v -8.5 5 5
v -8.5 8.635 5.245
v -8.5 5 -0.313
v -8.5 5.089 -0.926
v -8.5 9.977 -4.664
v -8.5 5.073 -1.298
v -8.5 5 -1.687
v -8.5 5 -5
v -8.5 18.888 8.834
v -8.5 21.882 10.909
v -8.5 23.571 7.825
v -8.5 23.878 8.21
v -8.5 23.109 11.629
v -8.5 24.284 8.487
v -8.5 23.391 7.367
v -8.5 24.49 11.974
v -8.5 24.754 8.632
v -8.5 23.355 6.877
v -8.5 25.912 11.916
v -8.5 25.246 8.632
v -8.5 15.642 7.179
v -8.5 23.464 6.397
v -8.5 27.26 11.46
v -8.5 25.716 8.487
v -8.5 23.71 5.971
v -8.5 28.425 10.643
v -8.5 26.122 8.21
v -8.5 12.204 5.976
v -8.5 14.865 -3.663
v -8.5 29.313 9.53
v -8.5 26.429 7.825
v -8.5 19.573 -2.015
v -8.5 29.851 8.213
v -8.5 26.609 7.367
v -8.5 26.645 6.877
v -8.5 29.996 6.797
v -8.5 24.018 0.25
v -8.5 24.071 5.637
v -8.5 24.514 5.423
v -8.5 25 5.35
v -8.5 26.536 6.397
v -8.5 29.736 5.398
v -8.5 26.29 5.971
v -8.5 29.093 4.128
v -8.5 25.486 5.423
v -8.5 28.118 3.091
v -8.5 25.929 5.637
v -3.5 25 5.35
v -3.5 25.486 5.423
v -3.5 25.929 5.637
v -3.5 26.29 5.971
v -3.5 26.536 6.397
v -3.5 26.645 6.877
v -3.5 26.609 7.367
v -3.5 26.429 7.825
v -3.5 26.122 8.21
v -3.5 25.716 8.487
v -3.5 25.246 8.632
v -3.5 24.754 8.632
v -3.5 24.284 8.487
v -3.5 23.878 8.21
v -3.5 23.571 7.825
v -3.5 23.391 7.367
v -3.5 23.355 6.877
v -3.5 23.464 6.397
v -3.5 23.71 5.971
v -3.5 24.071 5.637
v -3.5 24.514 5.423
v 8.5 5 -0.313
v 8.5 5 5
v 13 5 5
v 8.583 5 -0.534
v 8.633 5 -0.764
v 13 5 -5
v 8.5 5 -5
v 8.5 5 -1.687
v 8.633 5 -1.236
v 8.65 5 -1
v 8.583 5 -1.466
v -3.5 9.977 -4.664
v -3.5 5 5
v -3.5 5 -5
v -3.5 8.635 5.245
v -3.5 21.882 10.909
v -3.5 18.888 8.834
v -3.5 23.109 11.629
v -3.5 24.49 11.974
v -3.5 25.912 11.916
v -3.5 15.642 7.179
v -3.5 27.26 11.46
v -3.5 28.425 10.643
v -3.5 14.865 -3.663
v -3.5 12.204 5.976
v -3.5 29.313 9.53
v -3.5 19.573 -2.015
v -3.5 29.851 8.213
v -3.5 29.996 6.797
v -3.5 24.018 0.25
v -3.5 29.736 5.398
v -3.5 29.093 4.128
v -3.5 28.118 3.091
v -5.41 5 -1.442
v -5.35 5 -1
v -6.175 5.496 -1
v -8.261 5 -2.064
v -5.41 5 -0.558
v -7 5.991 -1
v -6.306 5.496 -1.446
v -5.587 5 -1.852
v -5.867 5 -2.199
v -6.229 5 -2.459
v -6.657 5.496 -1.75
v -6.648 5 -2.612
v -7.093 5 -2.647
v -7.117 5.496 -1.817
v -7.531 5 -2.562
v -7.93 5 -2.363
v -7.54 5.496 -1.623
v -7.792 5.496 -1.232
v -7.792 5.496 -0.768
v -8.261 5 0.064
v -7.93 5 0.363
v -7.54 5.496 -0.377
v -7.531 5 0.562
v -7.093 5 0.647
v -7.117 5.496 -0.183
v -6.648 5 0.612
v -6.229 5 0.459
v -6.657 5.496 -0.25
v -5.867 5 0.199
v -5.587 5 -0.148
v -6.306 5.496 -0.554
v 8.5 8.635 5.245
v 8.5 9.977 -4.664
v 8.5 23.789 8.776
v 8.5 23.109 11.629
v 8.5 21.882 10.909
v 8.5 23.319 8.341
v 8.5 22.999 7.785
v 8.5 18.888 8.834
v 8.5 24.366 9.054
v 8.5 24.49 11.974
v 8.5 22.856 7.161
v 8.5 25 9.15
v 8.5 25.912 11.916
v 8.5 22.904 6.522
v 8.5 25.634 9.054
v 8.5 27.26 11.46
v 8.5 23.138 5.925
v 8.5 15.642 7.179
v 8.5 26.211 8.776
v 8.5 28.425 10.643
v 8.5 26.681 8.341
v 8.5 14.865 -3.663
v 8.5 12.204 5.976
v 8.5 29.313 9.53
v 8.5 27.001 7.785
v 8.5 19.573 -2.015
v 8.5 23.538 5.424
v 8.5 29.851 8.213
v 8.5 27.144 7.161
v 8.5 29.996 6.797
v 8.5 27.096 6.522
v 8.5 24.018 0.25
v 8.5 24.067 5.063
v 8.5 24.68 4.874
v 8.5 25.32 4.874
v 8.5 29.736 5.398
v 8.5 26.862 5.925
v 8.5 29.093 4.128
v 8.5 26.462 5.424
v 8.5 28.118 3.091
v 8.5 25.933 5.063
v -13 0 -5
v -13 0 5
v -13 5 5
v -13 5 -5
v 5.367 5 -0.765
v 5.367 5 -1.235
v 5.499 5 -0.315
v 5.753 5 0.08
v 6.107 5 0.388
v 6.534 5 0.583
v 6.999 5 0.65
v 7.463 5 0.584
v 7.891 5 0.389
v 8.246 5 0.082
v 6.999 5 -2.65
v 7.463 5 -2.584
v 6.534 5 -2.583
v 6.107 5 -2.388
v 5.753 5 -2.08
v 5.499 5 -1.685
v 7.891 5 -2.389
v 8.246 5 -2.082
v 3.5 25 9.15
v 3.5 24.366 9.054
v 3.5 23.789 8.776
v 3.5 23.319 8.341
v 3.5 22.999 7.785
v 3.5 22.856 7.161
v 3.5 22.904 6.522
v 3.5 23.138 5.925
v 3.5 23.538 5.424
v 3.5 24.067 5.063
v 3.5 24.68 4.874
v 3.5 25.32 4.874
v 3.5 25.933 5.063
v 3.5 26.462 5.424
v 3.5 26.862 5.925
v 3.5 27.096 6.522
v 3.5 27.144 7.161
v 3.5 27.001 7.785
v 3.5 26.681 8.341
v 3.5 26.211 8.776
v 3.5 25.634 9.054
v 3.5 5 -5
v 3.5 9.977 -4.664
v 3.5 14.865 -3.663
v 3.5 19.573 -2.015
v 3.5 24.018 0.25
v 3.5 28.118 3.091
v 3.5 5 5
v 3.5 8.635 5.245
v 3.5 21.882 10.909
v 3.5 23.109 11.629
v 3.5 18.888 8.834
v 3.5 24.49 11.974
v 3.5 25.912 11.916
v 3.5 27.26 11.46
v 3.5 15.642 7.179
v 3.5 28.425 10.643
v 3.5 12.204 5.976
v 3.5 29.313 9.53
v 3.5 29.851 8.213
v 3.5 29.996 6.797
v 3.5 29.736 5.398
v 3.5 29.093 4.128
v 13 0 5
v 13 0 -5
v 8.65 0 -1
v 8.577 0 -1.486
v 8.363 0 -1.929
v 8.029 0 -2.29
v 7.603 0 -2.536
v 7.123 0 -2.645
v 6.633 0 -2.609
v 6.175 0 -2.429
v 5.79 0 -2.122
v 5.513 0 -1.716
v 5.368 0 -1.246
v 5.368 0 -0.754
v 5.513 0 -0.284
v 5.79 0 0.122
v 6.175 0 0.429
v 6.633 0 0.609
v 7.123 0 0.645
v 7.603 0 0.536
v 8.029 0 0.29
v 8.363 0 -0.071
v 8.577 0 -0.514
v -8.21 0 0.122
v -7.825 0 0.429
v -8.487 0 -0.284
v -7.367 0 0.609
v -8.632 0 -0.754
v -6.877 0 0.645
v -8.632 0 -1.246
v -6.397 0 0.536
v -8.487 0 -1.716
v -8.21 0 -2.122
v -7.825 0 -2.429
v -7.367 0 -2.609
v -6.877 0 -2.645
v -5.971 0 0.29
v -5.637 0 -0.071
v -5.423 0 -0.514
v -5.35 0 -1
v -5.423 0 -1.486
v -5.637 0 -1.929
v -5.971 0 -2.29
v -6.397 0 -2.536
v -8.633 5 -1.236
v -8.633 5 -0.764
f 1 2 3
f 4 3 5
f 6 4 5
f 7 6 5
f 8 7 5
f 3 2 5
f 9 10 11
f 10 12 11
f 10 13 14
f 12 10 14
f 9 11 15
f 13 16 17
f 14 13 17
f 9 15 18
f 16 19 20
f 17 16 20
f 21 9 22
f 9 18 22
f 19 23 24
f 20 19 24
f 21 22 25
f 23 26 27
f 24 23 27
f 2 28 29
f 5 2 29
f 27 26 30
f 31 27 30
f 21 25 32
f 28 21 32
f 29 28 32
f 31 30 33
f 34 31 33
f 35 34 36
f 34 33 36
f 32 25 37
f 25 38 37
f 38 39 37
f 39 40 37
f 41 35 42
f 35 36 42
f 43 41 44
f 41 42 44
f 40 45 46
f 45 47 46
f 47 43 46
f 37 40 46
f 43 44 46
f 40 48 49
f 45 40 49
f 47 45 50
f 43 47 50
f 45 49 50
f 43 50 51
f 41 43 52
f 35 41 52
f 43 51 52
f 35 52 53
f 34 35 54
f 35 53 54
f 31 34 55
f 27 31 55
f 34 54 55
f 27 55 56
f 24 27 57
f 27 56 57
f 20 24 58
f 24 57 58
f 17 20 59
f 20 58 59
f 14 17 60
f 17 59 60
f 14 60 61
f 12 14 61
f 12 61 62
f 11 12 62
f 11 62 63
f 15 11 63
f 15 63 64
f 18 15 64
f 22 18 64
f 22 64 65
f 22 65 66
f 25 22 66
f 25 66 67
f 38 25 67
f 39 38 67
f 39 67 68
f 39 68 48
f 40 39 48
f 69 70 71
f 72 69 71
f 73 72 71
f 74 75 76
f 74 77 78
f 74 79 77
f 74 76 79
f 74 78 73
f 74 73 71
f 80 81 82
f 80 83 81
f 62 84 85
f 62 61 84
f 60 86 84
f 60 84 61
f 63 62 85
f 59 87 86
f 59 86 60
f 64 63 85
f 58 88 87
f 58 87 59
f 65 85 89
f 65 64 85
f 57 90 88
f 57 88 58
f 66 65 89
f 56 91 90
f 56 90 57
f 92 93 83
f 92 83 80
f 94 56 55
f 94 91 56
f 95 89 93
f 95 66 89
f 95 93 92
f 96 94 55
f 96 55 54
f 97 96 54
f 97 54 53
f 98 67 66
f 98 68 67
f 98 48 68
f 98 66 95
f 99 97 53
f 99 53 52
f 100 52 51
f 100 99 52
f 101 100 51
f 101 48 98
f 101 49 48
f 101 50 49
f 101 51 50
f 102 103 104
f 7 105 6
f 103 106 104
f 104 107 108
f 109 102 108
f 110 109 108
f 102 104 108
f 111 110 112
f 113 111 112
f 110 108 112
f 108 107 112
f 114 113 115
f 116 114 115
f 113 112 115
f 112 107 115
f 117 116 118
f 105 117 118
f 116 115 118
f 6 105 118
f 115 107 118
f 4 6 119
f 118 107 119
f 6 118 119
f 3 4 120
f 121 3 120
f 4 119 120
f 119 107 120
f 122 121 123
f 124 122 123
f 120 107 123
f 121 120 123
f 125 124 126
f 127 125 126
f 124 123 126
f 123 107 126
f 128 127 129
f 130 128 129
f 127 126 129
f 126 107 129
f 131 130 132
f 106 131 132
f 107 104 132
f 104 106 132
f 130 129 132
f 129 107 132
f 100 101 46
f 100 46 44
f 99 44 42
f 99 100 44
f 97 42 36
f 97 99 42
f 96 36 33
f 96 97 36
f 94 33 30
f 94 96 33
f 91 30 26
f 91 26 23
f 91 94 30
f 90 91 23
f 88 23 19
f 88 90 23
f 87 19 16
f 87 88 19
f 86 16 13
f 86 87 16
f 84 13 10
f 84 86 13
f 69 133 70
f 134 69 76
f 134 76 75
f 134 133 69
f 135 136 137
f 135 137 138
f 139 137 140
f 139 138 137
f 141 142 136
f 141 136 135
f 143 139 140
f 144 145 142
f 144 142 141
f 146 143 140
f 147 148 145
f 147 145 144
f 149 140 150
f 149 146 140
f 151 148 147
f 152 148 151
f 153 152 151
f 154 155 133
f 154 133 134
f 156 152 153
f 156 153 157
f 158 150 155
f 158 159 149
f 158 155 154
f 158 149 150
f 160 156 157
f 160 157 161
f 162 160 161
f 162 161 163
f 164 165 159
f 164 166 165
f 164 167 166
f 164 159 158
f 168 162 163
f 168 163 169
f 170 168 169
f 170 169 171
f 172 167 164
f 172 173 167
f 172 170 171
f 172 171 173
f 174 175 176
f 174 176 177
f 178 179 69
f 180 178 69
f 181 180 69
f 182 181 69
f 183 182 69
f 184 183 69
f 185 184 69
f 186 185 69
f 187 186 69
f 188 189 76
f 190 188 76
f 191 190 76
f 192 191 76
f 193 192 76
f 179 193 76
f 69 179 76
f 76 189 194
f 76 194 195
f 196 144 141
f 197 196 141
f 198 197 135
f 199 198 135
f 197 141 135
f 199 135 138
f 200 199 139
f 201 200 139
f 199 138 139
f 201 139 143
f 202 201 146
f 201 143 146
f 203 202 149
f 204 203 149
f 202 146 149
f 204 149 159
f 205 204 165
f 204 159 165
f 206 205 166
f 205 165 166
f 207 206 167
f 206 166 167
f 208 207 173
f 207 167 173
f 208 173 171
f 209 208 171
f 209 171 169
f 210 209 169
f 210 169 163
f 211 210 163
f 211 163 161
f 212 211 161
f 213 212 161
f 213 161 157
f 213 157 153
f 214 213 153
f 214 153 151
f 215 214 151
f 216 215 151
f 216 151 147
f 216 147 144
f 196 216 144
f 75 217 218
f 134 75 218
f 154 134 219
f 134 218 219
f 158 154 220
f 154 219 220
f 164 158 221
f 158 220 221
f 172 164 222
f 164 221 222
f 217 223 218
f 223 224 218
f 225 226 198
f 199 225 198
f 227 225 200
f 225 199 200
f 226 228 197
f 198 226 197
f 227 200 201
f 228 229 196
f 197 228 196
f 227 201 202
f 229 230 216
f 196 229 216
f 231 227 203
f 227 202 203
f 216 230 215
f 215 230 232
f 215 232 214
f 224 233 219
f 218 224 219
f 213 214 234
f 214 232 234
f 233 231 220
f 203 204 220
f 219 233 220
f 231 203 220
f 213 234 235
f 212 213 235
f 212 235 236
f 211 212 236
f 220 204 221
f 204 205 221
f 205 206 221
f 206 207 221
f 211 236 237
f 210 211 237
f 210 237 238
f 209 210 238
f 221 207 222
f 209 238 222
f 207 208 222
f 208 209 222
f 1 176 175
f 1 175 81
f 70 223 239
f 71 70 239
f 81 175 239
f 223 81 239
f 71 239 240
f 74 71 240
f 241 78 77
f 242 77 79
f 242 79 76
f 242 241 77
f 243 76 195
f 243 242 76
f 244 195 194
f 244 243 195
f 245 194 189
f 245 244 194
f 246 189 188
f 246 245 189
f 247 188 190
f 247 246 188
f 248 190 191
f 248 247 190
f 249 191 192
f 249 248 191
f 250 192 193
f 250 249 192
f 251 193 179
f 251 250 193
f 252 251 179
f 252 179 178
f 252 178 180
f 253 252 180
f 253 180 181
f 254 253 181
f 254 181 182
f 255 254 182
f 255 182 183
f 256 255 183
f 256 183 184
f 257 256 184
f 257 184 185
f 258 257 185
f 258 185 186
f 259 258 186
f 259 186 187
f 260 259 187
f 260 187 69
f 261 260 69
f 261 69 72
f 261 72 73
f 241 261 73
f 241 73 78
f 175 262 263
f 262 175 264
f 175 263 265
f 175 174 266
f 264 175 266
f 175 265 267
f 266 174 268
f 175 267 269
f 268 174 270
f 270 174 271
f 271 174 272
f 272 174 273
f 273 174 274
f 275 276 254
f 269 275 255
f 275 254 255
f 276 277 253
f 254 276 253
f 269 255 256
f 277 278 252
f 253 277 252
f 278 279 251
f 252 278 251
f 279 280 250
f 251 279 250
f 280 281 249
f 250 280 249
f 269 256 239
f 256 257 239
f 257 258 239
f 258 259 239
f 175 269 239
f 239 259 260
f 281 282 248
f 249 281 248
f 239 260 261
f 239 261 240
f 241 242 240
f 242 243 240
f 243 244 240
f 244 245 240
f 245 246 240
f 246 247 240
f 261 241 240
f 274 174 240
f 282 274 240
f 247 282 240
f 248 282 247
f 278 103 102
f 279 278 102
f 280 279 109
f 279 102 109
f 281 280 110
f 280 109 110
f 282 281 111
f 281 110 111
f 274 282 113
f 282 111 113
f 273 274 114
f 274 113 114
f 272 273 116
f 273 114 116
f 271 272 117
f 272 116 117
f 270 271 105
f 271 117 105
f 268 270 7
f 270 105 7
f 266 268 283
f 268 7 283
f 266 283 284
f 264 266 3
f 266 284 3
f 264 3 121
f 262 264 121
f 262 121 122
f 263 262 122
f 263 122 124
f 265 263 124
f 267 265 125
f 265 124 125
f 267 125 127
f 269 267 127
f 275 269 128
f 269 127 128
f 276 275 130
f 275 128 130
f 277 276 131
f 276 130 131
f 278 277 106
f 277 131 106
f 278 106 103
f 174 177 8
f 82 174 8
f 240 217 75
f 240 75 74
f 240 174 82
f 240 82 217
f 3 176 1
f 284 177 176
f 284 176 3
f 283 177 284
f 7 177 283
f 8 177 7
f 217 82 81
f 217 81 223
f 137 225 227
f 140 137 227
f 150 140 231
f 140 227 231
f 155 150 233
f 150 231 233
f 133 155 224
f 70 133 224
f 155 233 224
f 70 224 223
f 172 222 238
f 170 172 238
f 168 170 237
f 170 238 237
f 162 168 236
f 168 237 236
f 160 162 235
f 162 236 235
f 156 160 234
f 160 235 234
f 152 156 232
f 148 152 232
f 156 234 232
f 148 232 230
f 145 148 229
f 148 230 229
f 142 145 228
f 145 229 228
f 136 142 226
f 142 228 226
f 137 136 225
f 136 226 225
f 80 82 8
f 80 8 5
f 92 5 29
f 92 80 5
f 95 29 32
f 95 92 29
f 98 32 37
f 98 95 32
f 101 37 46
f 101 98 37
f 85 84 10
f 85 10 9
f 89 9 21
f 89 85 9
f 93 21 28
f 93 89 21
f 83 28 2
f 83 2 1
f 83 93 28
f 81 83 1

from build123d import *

# Parameters (mm, degrees)
SKETCH_1_W                   = 26
SKETCH_1_H                   = 10
EXTRUDE_1_DEPTH              = 5
EXTRUDE_START                = 3.5
EXTRUDE_2_DEPTH              = 5
HOLE_WIZARD_M4_1_REACH       = 37.089
HOLE_WIZARD_M4_1_BORE_R      = 2.15
HOLE_WIZARD_M4_1_2_OUTLINE_R = 1.65
HOLE_WIZARD_M4_1_2_DEPTH     = 5
HOLE_WIZARD_M4_2_D           = 3.3


# Read off the part's stored shape, not the designer's step: M4 螺纹孔1
with BuildPart() as part:
    # 草图1 → 凸台-拉伸1 (new body)
    with BuildSketch(Plane(origin=(0, 0, 0), x_dir=(1, 0, 0), z_dir=(0, 1, 0))):
        Rectangle(SKETCH_1_W, SKETCH_1_H)
    extrude(amount=EXTRUDE_1_DEPTH)

    # 草图2 → 凸台-拉伸2 (add)
    with BuildSketch(Plane(origin=(0, 0, 0), x_dir=(0, 0, -1), z_dir=(1, 0, 0)).offset(EXTRUDE_START)):
        with BuildLine():
            Line((-5, 5), (5, 5))
            ThreePointArc((5, 5), (2.918749068, 17.246562174), (-3.091314031, 28.118040089))
            ThreePointArc((-3.091314031, 28.118040089), (-10.118040089, 28.908685969), (-10.908685969, 21.881959911))
            ThreePointArc((-10.908685969, 21.881959911), (-6.519834496, 13.943057927), (-5, 5))
        make_face()
    extrude_2 = extrude(amount=EXTRUDE_2_DEPTH)

    # 镜向1: 凸台-拉伸2 across plane
    add(extrude_2.mirror(Plane(origin=(0, 0, 0), x_dir=(0, 0, 1), z_dir=(1, 0, 0))))

    # Hole Wizard M4 _1 bore (on position points) → Hole Wizard M4 _1 (cut, up to next)
    with BuildSketch(Plane(origin=(8.5, 25, 7), x_dir=(0, 0, 1), z_dir=(1, 0, 0)), mode=Mode.PRIVATE) as hole_wizard_m4_1_sk1:
        Circle(HOLE_WIZARD_M4_1_BORE_R)
    hole_wizard_m4_1_tool1 = extrude(hole_wizard_m4_1_sk1.sketch, amount=-HOLE_WIZARD_M4_1_REACH, mode=Mode.PRIVATE) & part.part
    add(hole_wizard_m4_1_tool1.solids().sort_by_distance((8.5, 25, 7))[0], mode=Mode.SUBTRACT)

    # Hole Wizard M4 _1 2 outline → Hole Wizard M4 _1 2 (cut)
    with BuildSketch(Plane(origin=(0, 0, 0), x_dir=(1, 0, 0), z_dir=(0, 1, 0))):
        with Locations((7, 1)):
            Circle(HOLE_WIZARD_M4_1_2_OUTLINE_R)
    extrude(amount=HOLE_WIZARD_M4_1_2_DEPTH, mode=Mode.SUBTRACT)

    # Hole Wizard M4 _1 2 2 outline → Hole Wizard M4 _1 2 2 (revolve, cut)
    with BuildSketch(Plane(origin=(-7, 0, -1), x_dir=(1, 0, 0), z_dir=(0, 0, 1))):
        Polygon((1.650000121, 4.999999927), (0, 5.991420021), (0, 0), (1.650000121, 0), align=None)
    revolve(axis=Axis((-7, 0, -1), (0, 1, 0)), mode=Mode.SUBTRACT)

    # M4 螺纹孔2 (through all)
    with Locations(Plane.ZY.offset(8.5)):
        with Locations((7, 25)):
            Hole(HOLE_WIZARD_M4_2_D / 2)


solid = part.part
